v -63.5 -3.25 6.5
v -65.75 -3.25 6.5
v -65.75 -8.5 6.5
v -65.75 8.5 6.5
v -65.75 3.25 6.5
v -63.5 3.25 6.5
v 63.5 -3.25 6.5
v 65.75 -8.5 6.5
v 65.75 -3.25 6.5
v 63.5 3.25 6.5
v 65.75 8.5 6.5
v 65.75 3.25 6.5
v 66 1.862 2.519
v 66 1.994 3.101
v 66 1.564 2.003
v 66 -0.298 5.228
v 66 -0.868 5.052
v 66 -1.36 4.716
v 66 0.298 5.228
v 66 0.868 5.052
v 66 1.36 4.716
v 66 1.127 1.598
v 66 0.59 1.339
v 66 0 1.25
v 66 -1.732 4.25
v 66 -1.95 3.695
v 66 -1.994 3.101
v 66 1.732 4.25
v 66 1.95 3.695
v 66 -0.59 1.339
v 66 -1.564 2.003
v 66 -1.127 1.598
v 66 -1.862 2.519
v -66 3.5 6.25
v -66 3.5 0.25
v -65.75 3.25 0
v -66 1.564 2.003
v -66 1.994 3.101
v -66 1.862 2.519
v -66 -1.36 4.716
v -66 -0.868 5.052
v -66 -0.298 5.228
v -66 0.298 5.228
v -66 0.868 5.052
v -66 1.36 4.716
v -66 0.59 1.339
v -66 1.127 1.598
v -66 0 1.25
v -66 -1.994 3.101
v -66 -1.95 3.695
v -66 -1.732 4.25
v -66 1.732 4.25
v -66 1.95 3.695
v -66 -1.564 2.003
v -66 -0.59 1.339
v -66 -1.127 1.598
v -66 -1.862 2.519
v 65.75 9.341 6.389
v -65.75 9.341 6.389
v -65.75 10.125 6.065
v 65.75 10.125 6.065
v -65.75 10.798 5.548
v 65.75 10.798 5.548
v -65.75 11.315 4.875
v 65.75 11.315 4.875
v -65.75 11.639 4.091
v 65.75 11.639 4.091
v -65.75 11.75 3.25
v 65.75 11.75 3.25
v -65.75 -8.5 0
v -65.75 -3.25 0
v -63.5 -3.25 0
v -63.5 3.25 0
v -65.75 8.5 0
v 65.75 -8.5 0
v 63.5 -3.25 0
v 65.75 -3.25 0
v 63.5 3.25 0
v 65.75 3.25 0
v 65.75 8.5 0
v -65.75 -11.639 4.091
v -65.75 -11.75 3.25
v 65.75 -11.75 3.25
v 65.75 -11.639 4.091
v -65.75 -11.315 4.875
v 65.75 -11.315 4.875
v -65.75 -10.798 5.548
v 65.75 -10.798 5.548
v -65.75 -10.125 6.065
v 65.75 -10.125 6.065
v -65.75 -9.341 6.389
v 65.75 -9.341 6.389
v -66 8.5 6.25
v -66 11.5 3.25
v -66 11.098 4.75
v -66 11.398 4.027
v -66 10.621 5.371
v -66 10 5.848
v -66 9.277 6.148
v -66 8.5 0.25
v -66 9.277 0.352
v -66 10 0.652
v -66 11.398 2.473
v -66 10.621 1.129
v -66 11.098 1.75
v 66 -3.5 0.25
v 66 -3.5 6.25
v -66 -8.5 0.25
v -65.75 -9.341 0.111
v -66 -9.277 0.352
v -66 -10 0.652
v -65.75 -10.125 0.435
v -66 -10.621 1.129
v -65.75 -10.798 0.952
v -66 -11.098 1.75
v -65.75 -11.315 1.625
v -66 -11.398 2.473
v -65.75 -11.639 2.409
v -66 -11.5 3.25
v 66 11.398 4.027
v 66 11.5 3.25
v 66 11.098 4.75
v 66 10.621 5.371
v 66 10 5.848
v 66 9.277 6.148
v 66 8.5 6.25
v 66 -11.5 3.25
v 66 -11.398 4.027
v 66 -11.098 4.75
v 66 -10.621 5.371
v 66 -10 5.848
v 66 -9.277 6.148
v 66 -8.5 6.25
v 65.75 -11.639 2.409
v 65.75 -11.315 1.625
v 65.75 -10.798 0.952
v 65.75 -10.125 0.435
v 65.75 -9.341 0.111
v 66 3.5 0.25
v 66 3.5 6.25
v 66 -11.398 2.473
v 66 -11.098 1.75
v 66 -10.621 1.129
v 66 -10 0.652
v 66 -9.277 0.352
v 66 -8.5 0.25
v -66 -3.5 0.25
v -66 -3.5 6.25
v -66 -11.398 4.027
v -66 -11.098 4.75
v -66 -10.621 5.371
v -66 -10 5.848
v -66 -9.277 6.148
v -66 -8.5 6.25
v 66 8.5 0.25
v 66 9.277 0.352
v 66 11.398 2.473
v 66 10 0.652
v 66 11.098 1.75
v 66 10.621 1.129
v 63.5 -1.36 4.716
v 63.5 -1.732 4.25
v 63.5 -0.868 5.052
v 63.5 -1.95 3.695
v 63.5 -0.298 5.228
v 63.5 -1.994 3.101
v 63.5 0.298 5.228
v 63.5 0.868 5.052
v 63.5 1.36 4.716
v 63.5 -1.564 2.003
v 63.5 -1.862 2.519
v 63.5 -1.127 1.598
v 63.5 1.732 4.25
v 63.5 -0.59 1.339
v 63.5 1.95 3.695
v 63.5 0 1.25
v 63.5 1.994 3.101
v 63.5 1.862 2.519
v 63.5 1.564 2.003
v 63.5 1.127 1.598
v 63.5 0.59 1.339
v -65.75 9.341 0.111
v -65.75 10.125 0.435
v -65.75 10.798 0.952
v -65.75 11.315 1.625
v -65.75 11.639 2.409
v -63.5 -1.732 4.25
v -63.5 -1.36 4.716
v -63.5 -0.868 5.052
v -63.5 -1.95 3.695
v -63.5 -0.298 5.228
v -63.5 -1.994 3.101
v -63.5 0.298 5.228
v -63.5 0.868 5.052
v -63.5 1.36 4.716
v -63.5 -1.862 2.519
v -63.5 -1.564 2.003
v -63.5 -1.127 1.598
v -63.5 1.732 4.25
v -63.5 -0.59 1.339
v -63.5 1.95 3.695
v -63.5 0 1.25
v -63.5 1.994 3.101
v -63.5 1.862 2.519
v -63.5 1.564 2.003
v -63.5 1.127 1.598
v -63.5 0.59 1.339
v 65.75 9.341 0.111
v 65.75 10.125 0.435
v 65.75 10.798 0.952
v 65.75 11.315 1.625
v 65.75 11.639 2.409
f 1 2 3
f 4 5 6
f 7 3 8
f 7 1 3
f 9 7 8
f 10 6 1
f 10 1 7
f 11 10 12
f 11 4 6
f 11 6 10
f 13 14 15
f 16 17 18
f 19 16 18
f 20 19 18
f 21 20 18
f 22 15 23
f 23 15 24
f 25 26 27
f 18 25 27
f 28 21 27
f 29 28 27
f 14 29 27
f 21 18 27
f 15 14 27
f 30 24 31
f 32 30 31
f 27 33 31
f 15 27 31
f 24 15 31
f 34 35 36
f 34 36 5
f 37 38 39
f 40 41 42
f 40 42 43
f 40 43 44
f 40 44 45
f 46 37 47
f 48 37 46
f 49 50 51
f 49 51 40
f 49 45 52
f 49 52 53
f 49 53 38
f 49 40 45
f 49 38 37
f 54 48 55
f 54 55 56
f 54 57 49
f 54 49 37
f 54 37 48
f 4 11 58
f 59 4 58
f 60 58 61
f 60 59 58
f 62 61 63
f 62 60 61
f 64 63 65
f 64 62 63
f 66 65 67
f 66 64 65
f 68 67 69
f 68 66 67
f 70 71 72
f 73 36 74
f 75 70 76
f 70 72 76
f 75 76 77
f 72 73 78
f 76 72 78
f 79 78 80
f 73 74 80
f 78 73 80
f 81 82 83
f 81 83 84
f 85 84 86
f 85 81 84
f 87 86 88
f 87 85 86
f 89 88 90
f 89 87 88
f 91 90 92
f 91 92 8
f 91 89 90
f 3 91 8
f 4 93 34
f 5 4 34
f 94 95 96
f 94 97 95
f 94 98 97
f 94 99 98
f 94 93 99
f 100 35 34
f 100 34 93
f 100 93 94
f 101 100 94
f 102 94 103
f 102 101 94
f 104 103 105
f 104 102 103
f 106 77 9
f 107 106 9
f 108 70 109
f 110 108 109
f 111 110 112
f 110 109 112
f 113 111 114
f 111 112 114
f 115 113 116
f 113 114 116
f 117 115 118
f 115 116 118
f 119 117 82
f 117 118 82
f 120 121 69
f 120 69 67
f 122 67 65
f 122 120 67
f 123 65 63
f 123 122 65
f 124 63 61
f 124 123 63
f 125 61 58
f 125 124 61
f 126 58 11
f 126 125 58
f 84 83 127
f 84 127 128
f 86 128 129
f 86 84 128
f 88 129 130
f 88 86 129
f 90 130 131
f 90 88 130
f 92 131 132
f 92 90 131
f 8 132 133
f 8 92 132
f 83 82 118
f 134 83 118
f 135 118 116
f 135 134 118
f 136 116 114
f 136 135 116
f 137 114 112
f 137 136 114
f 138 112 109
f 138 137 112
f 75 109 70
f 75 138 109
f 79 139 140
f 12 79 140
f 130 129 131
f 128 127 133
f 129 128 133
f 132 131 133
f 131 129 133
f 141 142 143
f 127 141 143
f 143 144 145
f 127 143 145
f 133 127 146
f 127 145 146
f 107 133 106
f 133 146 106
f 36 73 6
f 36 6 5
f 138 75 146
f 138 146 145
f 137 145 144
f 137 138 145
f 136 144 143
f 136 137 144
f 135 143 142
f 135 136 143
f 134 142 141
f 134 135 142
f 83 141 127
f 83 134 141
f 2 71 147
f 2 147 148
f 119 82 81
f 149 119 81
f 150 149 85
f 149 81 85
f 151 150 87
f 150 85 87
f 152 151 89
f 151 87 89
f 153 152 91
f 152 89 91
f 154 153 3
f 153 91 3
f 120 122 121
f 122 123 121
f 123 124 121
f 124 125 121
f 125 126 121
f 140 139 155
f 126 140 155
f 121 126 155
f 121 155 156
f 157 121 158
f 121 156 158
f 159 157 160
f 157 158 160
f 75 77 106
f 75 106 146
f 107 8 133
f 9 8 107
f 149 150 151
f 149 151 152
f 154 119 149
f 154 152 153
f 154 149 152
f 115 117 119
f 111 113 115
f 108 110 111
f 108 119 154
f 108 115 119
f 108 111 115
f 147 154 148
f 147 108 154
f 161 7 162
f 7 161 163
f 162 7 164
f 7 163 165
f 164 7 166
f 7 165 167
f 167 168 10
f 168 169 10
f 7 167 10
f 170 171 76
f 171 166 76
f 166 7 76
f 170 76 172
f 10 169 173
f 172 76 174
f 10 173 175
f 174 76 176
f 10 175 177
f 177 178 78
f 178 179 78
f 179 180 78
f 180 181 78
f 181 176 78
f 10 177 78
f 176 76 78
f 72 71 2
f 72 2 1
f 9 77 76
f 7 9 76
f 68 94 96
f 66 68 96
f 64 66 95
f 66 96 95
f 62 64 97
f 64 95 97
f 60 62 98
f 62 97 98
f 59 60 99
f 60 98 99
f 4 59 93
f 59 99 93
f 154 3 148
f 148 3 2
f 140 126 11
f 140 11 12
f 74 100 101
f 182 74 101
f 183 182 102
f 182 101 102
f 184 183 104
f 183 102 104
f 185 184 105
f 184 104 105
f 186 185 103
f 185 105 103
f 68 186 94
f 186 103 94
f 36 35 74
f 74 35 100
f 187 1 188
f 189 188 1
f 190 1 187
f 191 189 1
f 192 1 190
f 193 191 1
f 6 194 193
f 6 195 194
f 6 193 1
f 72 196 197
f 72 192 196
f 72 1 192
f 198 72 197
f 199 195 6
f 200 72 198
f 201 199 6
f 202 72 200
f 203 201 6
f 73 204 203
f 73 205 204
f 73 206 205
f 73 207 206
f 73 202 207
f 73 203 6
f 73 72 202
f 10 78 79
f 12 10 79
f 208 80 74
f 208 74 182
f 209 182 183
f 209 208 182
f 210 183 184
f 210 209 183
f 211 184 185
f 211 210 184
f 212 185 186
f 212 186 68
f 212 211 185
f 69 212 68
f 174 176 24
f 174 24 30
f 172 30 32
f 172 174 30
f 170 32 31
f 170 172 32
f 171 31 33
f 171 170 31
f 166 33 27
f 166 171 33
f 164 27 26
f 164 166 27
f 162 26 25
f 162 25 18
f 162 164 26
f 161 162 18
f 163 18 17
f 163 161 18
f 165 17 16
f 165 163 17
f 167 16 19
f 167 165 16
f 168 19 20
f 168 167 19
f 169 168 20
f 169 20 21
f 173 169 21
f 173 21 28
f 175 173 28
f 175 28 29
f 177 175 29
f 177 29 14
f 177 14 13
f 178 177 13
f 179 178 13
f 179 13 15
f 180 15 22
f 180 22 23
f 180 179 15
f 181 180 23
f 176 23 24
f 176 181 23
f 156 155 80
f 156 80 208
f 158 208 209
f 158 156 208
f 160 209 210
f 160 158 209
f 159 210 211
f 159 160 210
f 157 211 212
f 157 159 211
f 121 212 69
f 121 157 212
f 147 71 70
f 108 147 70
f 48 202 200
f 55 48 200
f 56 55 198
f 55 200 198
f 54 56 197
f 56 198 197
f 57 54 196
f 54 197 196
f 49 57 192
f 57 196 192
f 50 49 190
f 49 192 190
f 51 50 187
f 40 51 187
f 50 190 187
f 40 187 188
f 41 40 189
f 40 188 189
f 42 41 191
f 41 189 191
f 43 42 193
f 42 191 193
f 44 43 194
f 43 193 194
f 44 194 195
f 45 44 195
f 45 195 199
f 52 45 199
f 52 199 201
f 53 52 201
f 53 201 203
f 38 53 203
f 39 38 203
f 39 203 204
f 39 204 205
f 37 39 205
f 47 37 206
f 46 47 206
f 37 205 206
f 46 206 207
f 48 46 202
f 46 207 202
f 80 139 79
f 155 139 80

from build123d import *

# Parameters (mm, degrees)
BOSS_EXTRUDE1_DEPTH = 6.5
SKETCH2_R           = 2
BOSS_EXTRUDE2_DEPTH = 2.5
FILLET5_R           = 3.25
CHAMFER1_SIZE       = 0.25


with BuildPart() as part:
    # Sketch1 → Boss-Extrude1 (new body)
    with BuildSketch(Plane.XY):
        Polygon((0, -11.75), (-66, -11.75), (-66, -3.25), (-63.5, -3.25), (-63.5, 3.25), (-66, 3.25), (-66, 11.75), (0, 11.75), align=None)
    boss_extrude1 = extrude(amount=BOSS_EXTRUDE1_DEPTH)

    # Sketch2 → Boss-Extrude2 (add)
    with BuildSketch(Plane.ZY.offset(63.5)):
        with Locations(Location((3.25, 0, 0), (0, 0, 180))):
            Circle(SKETCH2_R)
    boss_extrude2 = extrude(amount=BOSS_EXTRUDE2_DEPTH)

    # Mirror1: Boss-Extrude1, Boss-Extrude2 across plane
    add(boss_extrude1.mirror(Plane(origin=(0, 0, 0), x_dir=(0, 0, 1), z_dir=(1, 0, 0))))
    add(boss_extrude2.mirror(Plane(origin=(0, 0, 0), x_dir=(0, 0, 1), z_dir=(1, 0, 0))))

    # Fillet5
    fillet5_edges = [part.edges().sort_by_distance(p)[0] for p in [
        (0, -11.75, 0),
        (0, -11.75, 6.5),
        (0, 11.75, 0),
        (0, 11.75, 6.5),
    ]]
    fillet(fillet5_edges, radius=FILLET5_R - 0.0001)  # a hair under: the kernel refuses the full size

    # Chamfer1
    chamfer1_edges = [part.edges().sort_by_distance(p)[0] for p in [
        (-66, -3.25, 3.25),
        (-66, 3.25, 3.25),
        (-66, -5.87505, 6.5),
        (66, -5.87505, 6.5),
        (66, -3.25, 3.25),
        (66, 3.25, 3.25),
        (66, -5.87505, 0),
        (66, -10.798126328, 5.548126328),
        (66, -10.798126328, 0.951873672),
        (66, 5.87505, 0),
        (-66, 5.87505, 0),
        (-66, -10.798126328, 5.548126328),
        (-66, -10.798126328, 0.951873672),
        (66, 5.87505, 6.5),
        (-66, 5.87505, 6.5),
        (-66, 10.798126328, 0.951873672),
        (-66, 10.798126328, 5.548126328),
        (66, 10.798126328, 0.951873672),
        (66, 10.798126328, 5.548126328),
        (-66, -5.87505, 0),
    ]]
    chamfer(chamfer1_edges, length=CHAMFER1_SIZE)


solid = part.part
